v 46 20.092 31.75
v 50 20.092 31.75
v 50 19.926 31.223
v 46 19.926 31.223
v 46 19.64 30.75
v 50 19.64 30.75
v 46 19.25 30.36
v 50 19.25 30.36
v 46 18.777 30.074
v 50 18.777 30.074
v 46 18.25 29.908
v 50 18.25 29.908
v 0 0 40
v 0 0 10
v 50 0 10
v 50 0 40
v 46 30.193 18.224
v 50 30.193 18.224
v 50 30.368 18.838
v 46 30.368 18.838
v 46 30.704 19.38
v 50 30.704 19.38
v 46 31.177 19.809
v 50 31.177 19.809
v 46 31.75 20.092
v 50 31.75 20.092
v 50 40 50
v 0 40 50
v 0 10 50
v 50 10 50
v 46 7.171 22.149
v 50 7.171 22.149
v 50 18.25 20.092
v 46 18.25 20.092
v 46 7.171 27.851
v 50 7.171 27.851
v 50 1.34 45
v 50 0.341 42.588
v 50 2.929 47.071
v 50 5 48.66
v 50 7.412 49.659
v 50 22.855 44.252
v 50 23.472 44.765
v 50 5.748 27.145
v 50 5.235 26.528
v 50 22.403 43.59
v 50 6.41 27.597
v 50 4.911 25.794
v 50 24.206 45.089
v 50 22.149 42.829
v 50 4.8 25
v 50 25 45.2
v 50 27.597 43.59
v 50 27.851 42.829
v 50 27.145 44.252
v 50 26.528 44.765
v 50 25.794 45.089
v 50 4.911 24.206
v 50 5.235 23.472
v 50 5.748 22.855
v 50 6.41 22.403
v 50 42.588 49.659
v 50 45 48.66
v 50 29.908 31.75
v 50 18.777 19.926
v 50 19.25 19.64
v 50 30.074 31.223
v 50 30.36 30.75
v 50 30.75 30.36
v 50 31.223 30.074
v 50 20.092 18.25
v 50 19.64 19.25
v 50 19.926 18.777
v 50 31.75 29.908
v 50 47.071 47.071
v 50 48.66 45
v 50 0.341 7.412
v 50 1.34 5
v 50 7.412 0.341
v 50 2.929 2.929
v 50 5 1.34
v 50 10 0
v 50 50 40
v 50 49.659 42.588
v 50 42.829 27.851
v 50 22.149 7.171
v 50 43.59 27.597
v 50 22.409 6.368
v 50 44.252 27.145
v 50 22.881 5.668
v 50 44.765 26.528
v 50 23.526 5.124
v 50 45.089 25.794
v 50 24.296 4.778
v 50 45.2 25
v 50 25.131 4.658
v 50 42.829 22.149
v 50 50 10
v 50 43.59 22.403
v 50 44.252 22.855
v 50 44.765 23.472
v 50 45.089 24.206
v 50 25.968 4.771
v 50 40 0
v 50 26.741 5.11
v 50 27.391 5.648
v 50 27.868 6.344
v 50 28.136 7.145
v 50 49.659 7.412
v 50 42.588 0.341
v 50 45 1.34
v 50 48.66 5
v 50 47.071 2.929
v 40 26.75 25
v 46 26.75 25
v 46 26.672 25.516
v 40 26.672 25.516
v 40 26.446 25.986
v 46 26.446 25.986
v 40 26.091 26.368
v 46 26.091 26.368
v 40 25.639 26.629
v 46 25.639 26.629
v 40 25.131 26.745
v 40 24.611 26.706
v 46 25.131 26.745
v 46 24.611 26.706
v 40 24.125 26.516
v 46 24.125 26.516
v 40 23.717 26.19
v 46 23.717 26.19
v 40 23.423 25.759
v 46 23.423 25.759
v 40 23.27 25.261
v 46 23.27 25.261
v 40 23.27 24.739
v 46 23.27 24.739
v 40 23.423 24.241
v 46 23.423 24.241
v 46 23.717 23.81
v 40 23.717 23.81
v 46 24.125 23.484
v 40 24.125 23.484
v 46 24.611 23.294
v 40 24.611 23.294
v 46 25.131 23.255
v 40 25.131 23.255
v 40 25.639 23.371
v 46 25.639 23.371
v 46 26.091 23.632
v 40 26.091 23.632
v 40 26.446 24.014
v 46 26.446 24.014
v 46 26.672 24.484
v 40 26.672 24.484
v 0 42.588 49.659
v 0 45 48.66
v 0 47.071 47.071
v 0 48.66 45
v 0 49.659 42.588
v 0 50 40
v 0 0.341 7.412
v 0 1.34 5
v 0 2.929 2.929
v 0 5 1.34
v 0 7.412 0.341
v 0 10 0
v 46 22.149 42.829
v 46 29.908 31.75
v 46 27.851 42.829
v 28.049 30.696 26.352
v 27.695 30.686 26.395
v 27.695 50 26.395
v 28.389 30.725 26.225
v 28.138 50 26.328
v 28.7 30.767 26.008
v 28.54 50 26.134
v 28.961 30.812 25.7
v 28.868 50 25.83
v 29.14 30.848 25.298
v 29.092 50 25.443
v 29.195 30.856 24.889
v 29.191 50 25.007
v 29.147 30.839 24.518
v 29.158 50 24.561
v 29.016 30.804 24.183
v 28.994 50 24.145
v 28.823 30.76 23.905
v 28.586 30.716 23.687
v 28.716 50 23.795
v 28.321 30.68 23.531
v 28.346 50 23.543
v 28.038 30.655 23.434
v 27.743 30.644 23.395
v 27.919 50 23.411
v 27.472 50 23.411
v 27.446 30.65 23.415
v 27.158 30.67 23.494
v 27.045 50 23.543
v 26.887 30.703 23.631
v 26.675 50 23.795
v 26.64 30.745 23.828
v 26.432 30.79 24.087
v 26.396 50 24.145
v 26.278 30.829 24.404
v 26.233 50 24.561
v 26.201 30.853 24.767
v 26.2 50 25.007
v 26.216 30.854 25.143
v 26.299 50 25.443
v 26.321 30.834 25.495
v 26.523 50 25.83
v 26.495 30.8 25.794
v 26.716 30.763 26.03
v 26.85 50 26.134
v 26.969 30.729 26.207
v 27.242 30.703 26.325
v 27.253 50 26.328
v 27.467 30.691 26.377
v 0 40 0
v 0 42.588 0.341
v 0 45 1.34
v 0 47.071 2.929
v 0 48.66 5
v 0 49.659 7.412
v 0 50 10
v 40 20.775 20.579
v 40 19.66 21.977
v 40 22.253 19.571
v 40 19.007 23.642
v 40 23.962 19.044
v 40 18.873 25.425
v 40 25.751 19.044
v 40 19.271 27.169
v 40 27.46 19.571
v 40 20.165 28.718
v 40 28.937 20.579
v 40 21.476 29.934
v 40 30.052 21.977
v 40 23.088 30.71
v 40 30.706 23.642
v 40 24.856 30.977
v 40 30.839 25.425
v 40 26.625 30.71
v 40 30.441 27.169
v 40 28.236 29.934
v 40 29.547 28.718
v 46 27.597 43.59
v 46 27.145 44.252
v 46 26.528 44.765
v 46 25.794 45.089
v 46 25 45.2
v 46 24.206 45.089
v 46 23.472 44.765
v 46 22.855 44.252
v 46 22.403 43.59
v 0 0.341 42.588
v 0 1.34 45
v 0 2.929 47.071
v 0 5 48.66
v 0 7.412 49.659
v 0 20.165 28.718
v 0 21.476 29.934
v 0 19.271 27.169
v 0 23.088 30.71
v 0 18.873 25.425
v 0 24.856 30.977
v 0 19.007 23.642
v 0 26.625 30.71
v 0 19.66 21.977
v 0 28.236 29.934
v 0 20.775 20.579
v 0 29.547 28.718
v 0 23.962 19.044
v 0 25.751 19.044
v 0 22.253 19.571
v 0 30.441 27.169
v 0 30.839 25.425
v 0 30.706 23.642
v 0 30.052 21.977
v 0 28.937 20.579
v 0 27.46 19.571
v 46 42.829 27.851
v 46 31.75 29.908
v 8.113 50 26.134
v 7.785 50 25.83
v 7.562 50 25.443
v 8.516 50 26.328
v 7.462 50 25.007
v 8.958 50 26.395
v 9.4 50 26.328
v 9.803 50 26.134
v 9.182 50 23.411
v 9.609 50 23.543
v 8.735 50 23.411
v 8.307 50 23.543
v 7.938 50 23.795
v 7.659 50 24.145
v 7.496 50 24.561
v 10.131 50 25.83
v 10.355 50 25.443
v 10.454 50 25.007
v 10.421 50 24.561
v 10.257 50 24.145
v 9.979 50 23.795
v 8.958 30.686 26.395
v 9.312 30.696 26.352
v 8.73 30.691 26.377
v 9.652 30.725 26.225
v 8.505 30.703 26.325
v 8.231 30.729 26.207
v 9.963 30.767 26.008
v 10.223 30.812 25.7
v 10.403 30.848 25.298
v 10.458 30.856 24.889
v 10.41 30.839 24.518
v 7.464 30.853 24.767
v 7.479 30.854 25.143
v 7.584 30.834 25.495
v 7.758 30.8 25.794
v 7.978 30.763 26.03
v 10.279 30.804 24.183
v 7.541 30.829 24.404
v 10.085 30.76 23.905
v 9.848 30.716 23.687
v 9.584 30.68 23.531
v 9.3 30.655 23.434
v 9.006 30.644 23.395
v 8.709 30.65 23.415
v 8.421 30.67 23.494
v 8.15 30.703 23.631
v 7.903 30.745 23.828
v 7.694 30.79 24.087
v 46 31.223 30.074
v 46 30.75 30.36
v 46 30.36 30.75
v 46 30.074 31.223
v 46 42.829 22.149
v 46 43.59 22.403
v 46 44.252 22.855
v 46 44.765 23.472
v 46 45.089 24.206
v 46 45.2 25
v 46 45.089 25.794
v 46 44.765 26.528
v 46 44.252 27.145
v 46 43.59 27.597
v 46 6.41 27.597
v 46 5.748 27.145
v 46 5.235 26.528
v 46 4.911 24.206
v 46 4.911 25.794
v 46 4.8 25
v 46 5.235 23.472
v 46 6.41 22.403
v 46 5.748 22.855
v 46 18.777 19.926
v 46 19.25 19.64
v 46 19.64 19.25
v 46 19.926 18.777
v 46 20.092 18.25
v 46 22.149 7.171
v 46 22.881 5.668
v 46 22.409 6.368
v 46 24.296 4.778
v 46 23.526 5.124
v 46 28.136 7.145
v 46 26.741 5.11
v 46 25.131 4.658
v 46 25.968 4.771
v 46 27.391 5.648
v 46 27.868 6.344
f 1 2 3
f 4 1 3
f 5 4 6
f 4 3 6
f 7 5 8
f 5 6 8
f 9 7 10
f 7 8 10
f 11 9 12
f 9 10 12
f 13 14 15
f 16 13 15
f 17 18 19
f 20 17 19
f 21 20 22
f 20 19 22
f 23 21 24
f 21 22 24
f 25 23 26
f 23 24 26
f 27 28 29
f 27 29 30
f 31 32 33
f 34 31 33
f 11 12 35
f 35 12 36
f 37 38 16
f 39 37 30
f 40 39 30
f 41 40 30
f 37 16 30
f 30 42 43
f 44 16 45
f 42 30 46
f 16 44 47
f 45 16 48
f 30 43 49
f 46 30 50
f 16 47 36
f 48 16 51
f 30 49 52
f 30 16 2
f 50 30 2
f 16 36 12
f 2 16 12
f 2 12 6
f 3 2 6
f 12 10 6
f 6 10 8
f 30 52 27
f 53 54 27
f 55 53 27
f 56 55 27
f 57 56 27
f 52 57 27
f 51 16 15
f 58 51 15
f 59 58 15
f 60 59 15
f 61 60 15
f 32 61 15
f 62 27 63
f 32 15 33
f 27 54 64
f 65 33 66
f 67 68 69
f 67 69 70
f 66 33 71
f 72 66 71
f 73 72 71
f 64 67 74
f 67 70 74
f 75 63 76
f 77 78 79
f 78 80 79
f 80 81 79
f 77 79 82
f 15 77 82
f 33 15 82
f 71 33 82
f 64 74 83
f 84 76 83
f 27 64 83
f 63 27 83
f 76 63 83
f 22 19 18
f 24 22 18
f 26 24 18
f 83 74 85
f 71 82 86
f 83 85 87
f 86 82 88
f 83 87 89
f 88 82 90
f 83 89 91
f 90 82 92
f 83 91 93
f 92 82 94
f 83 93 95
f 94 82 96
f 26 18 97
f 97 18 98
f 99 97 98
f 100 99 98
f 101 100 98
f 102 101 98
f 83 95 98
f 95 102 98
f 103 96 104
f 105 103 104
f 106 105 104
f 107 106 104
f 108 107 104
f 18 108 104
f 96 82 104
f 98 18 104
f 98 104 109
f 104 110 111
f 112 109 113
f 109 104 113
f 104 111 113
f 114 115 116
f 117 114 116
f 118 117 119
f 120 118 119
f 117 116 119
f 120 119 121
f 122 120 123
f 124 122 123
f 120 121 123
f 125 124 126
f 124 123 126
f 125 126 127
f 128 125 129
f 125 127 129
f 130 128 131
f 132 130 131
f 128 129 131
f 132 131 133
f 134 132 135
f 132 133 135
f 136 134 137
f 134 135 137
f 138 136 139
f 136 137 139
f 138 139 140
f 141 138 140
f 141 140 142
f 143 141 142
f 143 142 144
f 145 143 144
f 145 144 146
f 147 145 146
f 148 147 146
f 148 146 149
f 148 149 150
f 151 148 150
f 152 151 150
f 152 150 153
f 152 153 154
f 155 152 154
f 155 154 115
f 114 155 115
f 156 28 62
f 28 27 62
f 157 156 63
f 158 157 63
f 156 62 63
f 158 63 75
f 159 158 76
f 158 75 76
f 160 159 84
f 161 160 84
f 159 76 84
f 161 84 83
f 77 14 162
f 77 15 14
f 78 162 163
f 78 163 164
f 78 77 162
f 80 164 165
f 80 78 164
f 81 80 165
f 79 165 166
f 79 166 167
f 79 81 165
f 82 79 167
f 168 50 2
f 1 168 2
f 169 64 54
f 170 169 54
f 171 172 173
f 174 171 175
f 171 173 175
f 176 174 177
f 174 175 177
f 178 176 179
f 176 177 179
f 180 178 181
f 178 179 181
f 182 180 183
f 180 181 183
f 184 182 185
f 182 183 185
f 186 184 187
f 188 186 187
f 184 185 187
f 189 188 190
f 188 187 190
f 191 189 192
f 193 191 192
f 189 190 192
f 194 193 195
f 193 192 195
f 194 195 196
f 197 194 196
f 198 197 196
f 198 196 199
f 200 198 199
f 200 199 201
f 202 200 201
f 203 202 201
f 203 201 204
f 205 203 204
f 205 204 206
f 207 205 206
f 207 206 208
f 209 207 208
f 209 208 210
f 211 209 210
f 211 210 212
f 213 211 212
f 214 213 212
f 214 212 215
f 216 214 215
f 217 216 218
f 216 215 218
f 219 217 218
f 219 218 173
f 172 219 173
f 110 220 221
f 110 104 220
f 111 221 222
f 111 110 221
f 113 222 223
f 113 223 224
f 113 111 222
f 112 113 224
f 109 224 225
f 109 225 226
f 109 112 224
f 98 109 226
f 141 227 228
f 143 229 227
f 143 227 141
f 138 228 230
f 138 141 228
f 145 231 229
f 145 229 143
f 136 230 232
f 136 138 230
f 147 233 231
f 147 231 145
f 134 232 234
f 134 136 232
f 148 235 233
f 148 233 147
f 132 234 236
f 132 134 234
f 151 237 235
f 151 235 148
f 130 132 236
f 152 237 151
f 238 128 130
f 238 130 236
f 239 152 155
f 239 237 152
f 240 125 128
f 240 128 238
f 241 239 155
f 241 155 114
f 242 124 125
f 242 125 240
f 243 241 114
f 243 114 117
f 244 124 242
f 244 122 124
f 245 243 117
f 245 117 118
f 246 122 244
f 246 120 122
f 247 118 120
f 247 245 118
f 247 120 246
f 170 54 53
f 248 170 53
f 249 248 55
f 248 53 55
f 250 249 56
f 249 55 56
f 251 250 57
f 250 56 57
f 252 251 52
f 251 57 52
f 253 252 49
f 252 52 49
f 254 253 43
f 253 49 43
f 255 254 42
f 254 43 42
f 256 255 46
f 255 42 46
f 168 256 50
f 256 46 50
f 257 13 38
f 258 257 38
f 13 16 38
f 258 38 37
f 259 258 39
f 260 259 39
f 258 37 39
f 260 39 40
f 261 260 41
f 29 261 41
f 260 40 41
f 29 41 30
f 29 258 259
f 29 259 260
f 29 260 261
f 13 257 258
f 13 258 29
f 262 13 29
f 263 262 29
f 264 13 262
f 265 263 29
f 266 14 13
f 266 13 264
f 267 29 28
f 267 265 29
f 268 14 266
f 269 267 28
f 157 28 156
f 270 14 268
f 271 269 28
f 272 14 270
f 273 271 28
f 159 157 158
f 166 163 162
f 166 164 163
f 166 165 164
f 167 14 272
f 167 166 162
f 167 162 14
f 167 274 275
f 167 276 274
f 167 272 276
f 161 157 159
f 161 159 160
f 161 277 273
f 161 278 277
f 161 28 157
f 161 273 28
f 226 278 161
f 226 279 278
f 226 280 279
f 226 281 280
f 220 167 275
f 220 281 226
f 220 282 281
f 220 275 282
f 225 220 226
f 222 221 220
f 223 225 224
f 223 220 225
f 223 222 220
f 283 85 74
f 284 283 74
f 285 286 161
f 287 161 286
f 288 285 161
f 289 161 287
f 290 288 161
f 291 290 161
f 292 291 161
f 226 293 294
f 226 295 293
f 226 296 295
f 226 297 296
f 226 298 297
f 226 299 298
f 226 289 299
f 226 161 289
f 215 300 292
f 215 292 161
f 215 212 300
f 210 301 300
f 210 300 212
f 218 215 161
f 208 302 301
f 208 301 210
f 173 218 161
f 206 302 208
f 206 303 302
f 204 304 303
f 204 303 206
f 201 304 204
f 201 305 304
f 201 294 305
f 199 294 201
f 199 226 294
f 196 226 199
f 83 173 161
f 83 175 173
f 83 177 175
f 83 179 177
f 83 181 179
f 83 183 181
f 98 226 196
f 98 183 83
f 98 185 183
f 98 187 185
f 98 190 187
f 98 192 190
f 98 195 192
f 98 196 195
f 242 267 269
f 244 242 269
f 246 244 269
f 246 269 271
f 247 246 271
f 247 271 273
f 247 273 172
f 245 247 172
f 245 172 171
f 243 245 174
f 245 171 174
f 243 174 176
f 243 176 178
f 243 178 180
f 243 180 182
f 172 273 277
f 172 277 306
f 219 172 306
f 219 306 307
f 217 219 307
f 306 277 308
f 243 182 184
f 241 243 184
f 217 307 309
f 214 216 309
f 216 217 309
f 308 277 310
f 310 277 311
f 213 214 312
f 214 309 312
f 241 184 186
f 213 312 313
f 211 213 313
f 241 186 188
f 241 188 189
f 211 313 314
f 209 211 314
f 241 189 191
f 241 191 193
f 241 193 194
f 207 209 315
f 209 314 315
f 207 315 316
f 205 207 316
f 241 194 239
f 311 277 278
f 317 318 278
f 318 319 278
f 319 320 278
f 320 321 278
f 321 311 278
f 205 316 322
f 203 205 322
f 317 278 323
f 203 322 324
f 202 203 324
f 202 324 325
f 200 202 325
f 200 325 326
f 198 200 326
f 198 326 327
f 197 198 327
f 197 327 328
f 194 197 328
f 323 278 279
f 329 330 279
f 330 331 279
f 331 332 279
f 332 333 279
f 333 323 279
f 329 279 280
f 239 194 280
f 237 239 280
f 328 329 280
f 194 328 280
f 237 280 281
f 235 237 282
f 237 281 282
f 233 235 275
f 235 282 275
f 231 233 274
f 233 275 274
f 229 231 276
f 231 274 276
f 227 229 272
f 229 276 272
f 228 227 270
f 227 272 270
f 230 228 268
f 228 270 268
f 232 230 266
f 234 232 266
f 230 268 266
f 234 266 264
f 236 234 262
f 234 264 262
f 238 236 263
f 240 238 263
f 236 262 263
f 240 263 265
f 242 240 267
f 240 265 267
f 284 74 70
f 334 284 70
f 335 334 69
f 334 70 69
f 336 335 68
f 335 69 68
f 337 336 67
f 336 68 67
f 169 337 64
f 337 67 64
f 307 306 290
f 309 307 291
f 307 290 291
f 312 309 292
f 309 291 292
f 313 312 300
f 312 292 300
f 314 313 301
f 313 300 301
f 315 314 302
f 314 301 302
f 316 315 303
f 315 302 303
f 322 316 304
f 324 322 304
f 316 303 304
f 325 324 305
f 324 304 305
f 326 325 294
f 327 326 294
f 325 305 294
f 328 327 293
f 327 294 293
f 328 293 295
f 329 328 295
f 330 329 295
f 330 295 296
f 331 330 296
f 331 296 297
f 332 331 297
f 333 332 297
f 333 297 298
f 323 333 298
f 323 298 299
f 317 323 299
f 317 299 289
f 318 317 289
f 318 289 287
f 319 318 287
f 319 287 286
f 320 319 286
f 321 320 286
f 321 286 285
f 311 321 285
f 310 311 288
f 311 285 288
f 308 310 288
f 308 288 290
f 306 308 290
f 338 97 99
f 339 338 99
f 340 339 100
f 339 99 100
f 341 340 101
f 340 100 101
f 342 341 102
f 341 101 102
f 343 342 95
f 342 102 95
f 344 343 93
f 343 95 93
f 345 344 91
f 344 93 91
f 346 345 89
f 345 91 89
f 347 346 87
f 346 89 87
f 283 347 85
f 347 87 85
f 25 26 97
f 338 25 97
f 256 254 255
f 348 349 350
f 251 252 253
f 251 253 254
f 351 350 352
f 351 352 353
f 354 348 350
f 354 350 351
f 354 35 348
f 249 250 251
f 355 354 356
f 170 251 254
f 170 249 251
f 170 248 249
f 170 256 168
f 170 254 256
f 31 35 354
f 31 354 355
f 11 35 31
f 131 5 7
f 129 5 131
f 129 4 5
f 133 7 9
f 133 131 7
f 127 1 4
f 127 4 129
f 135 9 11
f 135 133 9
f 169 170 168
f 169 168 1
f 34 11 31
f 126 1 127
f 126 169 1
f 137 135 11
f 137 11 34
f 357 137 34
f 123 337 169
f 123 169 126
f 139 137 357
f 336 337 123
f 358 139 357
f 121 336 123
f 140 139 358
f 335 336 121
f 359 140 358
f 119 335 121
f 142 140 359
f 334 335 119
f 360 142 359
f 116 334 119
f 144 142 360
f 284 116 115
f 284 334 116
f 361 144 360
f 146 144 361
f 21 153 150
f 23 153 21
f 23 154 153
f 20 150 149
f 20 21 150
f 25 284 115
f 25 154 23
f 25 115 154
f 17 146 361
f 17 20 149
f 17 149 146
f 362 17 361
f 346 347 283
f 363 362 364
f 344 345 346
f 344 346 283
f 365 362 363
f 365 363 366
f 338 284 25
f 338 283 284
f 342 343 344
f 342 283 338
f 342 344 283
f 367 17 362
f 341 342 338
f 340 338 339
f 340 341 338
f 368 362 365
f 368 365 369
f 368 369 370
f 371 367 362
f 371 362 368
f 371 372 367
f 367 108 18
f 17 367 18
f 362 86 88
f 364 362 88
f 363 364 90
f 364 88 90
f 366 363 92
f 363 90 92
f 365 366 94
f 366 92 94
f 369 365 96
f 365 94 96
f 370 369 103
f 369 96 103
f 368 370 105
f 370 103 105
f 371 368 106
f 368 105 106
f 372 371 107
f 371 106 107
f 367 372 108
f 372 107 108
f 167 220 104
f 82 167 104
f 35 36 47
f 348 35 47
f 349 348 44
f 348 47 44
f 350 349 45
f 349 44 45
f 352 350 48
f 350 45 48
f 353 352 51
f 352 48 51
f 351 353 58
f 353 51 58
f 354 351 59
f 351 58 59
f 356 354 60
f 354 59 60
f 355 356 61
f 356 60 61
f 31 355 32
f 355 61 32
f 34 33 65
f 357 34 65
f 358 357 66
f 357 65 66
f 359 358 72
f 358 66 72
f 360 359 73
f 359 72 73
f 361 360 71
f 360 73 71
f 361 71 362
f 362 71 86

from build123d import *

# Parameters (mm, degrees)
ESQUISSE1_W             = 50
ESQUISSE1_H             = 50
BOSS_EXTRU_1_DEPTH      = 50
ESQUISSE2_R             = 6
ENL_V_MAT_EXTRU_1_DEPTH = 40
CONG_1_R                = 10
ESQUISSE3_R             = 1.5
ENL_V_MAT_EXTRU_2_DEPTH = 21
ENL_V_MAT_EXTRU_3_DEPTH = 4
ESQUISSE5_R             = 1.75
ENL_V_MAT_EXTRU_4_DEPTH = 90


with BuildPart() as part:
    # Esquisse1 → Boss.-Extru.1 (new body)
    with BuildSketch(Plane.XY):
        with Locations((25, 25)):
            Rectangle(ESQUISSE1_W, ESQUISSE1_H)
    extrude(amount=BOSS_EXTRU_1_DEPTH)

    # Esquisse2 → Enlèv. mat.-Extru.1 (cut)
    with BuildSketch(Plane.ZY):
        with Locations((24.976890997, 24.856256207)):
            Circle(ESQUISSE2_R)
    extrude(amount=-ENL_V_MAT_EXTRU_1_DEPTH, mode=Mode.SUBTRACT)

    # Congé1
    cong_1_edges = [part.edges().sort_by_distance(p)[0] for p in [
        (25, 50, 50),
        (25, 50, 0),
        (25, 0, 0),
        (25, 0, 50),
    ]]
    fillet(cong_1_edges, radius=CONG_1_R)

    # Esquisse3 → Enlèv. mat.-Extru.2 (cut)
    with BuildSketch(Plane(origin=(0, 50, 0), x_dir=(1, 0, 0), z_dir=(0, 1, 0))):
        with Locations(Location((8.958242403, -24.894645172, 0), (0, 0, 270))):
            Circle(ESQUISSE3_R)
        with Locations(Location((27.695396355, -24.894645172, 0), (0, 0, 270))):
            Circle(ESQUISSE3_R)
    extrude(amount=-ENL_V_MAT_EXTRU_2_DEPTH, mode=Mode.SUBTRACT)

    # Esquisse4 → Enlèv. mat.-Extru.3 (cut)
    with BuildSketch(Plane(origin=(50, 0, 0), x_dir=(0, 0, -1), z_dir=(1, 0, 0))):
        with BuildLine():
            Line((-7.144655121, 28.135805281), (-18.224176514, 30.192846764))
            ThreePointArc((-18.224176514, 30.192846764), (-19.380476075, 30.704407729), (-20.091653936, 31.749849906))
            Line((-20.091653936, 31.749849906), (-22.148695418, 42.829371299))
            ThreePointArc((-22.148695418, 42.829371299), (-24.9999654, 45.1999956), (-27.851235382, 42.829371299))
            Line((-27.851235382, 42.829371299), (-29.908276864, 31.749849906))
            ThreePointArc((-29.908276864, 31.749849906), (-30.543285097, 30.543354297), (-31.749780706, 29.908346064))
            Line((-31.749780706, 29.908346064), (-42.829302099, 27.851304582))
            ThreePointArc((-42.829302099, 27.851304582), (-45.1999264, 25.0000346), (-42.829302099, 22.148764618))
            Line((-42.829302099, 22.148764618), (-31.749780706, 20.091723136))
            ThreePointArc((-31.749780706, 20.091723136), (-30.543285097, 19.456714903), (-29.908276864, 18.250219294))
            Line((-29.908276864, 18.250219294), (-27.851235382, 7.170697901))
            ThreePointArc((-27.851235382, 7.170697901), (-24.9999654, 4.8000736), (-22.148695418, 7.170697901))
            Line((-22.148695418, 7.170697901), (-20.091653936, 18.250219294))
            ThreePointArc((-20.091653936, 18.250219294), (-19.456645703, 19.456714903), (-18.250150094, 20.091723136))
            Line((-18.250150094, 20.091723136), (-7.170628701, 22.148764618))
            ThreePointArc((-7.170628701, 22.148764618), (-4.657744871, 25.131439646), (-7.144655121, 28.135805281))
        make_face()
    extrude(amount=-ENL_V_MAT_EXTRU_3_DEPTH, mode=Mode.SUBTRACT)

    # Esquisse5 → Enlèv. mat.-Extru.4 (cut)
    with BuildSketch(Plane(origin=(46, 0, 0), x_dir=(0, 0, -1), z_dir=(1, 0, 0))):
        with Locations(Location((-24.9999654, 25.0000346, 0), (0, 0, 90))):
            Circle(ESQUISSE5_R)
    extrude(amount=-ENL_V_MAT_EXTRU_4_DEPTH, mode=Mode.SUBTRACT)


solid = part.part
